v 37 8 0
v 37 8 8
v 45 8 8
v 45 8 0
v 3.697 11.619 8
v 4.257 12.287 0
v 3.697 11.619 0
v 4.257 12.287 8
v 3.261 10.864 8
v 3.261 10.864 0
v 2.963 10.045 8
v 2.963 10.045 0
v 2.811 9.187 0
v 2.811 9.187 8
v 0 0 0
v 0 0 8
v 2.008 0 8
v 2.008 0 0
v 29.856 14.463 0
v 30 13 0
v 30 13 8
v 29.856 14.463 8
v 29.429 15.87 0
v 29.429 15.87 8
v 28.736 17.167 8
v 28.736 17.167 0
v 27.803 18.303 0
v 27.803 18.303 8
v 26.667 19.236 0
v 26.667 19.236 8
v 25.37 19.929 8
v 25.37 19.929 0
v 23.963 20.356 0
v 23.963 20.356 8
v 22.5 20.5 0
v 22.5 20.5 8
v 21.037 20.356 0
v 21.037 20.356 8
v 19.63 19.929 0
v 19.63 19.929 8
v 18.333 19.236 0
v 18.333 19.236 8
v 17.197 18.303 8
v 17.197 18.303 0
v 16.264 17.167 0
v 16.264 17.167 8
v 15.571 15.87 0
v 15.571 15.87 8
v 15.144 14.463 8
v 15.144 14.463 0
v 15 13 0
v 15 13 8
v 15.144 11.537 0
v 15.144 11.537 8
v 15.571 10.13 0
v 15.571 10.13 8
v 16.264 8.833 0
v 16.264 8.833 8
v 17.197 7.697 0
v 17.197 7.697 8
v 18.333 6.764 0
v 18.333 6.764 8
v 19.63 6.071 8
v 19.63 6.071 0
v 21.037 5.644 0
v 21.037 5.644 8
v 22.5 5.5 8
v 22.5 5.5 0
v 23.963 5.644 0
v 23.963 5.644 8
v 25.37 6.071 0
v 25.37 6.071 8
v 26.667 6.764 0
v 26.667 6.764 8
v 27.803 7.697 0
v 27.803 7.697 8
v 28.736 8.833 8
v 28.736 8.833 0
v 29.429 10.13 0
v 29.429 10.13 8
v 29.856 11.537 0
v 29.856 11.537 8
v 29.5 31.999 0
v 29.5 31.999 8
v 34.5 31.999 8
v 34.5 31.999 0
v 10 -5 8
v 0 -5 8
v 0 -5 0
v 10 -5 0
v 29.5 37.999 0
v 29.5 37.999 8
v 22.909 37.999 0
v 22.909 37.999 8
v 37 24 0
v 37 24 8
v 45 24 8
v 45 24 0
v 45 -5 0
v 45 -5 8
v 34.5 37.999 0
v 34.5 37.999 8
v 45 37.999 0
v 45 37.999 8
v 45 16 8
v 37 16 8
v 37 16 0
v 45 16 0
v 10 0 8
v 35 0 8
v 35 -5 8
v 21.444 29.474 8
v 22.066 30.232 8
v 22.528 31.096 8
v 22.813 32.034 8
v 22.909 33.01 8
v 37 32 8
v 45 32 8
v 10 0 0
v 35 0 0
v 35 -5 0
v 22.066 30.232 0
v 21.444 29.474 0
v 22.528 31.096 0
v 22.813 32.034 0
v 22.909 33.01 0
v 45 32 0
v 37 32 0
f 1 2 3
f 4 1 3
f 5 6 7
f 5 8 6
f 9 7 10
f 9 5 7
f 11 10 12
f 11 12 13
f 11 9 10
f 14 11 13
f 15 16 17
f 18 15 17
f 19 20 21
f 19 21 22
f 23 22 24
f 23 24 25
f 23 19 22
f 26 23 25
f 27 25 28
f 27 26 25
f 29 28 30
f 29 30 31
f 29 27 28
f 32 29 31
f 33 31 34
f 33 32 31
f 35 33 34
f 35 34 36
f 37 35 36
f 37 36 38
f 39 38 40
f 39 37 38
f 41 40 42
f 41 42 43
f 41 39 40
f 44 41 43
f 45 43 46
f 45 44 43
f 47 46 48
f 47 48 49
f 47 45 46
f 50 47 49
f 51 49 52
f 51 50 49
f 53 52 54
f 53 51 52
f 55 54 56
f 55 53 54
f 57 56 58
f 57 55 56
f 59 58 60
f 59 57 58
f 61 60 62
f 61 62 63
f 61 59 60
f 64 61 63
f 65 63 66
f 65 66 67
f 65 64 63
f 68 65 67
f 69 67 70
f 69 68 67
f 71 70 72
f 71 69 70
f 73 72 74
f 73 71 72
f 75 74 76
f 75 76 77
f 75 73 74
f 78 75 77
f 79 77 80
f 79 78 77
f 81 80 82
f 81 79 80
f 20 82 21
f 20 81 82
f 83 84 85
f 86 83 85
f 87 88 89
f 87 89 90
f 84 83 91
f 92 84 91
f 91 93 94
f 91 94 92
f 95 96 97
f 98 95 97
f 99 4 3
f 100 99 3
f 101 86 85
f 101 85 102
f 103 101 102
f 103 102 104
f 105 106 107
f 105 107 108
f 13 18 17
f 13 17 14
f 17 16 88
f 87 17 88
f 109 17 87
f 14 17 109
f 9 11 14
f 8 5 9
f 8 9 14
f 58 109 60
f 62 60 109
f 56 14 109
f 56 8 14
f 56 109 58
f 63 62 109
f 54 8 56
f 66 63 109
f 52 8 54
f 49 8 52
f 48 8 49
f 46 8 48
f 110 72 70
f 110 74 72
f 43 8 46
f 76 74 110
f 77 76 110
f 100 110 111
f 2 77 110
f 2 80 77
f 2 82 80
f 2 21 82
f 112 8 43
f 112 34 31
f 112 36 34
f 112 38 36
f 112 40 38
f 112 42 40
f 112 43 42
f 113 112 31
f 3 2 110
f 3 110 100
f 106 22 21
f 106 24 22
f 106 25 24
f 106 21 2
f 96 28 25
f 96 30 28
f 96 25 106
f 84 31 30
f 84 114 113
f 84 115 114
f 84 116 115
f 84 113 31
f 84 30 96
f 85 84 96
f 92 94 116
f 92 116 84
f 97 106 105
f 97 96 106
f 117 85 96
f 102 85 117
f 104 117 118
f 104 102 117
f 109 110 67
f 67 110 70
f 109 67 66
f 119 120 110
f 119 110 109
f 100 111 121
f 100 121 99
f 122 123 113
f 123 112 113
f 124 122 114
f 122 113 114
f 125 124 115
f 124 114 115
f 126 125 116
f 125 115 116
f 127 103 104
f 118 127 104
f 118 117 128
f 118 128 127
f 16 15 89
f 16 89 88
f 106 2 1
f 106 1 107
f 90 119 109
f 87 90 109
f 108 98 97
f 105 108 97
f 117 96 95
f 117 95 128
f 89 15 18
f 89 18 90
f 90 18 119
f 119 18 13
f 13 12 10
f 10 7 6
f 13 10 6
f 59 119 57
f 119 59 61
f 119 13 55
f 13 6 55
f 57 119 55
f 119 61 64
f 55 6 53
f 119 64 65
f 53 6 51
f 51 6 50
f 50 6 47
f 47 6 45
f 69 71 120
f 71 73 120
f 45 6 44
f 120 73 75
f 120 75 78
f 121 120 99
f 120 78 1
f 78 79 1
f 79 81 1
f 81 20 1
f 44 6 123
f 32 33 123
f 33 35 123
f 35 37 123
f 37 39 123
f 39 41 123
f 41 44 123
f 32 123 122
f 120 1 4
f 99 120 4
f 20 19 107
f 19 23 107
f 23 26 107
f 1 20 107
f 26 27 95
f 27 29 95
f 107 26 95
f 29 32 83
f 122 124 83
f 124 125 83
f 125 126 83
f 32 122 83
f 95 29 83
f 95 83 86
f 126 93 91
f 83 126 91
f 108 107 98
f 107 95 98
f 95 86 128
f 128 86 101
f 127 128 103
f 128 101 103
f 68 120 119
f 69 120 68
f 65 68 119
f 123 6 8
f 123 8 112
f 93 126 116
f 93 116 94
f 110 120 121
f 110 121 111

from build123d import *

# Parameters (mm, degrees)
SKETCH_1_R          = 7.5
EXTRUDE_1_DEPTH     = 8
FILLET_1_R          = 5
SKETCH_2_W          = 5
SKETCH_2_H          = 6
CUT_EXTRUDE_1_DEPTH = 8
SKETCH_3_W          = 10
SKETCH_3_H          = 8
EXTRUDE_2_DEPTH     = 5
SKETCH_4_W          = 8
SKETCH_4_H          = 8
CUT_EXTRUDE_2_DEPTH = 60.438258903


with BuildPart() as part:
    # 草图1 → 凸台-拉伸1 (new body)
    with BuildSketch(Plane.XY):
        Polygon((2.970014974, 11), (22.908786289, 30.938771315), (22.908786289, 37.998771315), (45, 37.998771315), (45, 0), (2.007639675, 0), align=None)
        with Locations((22.5, 13)):
            Circle(SKETCH_1_R, mode=Mode.SUBTRACT)
    extrude(amount=EXTRUDE_1_DEPTH)

    # 圆角1
    fillet_1_edges = [part.edges().sort_by_distance(p)[0] for p in [
        (2.970014974, 11, 4),
        (22.908786289, 30.938771315, 4),
    ]]
    fillet(fillet_1_edges, radius=FILLET_1_R)

    # 草图2 → 切除-拉伸1 (cut)
    with BuildSketch(Plane.XY.offset(8)):
        with Locations((32, 34.998771315)):
            Rectangle(SKETCH_2_W, SKETCH_2_H)
    extrude(amount=-CUT_EXTRUDE_1_DEPTH, mode=Mode.SUBTRACT)

    # 草图3 → 凸台-拉伸2 (add)
    with BuildSketch(Plane.XZ):
        with Locations((40, 4)):
            Rectangle(SKETCH_3_W, SKETCH_3_H)
        with Locations((5, 4)):
            Rectangle(SKETCH_3_W, SKETCH_3_H)
    extrude(amount=EXTRUDE_2_DEPTH)

    # 草图4 → 切除-拉伸2 (cut, through all)
    with BuildSketch(Plane.XY.offset(8)):
        with Locations((41, 12)):
            Rectangle(SKETCH_4_W, SKETCH_4_H)
        with Locations((41, 28)):
            Rectangle(SKETCH_4_W, SKETCH_4_H)
    extrude(amount=-CUT_EXTRUDE_2_DEPTH, mode=Mode.SUBTRACT)


solid = part.part
